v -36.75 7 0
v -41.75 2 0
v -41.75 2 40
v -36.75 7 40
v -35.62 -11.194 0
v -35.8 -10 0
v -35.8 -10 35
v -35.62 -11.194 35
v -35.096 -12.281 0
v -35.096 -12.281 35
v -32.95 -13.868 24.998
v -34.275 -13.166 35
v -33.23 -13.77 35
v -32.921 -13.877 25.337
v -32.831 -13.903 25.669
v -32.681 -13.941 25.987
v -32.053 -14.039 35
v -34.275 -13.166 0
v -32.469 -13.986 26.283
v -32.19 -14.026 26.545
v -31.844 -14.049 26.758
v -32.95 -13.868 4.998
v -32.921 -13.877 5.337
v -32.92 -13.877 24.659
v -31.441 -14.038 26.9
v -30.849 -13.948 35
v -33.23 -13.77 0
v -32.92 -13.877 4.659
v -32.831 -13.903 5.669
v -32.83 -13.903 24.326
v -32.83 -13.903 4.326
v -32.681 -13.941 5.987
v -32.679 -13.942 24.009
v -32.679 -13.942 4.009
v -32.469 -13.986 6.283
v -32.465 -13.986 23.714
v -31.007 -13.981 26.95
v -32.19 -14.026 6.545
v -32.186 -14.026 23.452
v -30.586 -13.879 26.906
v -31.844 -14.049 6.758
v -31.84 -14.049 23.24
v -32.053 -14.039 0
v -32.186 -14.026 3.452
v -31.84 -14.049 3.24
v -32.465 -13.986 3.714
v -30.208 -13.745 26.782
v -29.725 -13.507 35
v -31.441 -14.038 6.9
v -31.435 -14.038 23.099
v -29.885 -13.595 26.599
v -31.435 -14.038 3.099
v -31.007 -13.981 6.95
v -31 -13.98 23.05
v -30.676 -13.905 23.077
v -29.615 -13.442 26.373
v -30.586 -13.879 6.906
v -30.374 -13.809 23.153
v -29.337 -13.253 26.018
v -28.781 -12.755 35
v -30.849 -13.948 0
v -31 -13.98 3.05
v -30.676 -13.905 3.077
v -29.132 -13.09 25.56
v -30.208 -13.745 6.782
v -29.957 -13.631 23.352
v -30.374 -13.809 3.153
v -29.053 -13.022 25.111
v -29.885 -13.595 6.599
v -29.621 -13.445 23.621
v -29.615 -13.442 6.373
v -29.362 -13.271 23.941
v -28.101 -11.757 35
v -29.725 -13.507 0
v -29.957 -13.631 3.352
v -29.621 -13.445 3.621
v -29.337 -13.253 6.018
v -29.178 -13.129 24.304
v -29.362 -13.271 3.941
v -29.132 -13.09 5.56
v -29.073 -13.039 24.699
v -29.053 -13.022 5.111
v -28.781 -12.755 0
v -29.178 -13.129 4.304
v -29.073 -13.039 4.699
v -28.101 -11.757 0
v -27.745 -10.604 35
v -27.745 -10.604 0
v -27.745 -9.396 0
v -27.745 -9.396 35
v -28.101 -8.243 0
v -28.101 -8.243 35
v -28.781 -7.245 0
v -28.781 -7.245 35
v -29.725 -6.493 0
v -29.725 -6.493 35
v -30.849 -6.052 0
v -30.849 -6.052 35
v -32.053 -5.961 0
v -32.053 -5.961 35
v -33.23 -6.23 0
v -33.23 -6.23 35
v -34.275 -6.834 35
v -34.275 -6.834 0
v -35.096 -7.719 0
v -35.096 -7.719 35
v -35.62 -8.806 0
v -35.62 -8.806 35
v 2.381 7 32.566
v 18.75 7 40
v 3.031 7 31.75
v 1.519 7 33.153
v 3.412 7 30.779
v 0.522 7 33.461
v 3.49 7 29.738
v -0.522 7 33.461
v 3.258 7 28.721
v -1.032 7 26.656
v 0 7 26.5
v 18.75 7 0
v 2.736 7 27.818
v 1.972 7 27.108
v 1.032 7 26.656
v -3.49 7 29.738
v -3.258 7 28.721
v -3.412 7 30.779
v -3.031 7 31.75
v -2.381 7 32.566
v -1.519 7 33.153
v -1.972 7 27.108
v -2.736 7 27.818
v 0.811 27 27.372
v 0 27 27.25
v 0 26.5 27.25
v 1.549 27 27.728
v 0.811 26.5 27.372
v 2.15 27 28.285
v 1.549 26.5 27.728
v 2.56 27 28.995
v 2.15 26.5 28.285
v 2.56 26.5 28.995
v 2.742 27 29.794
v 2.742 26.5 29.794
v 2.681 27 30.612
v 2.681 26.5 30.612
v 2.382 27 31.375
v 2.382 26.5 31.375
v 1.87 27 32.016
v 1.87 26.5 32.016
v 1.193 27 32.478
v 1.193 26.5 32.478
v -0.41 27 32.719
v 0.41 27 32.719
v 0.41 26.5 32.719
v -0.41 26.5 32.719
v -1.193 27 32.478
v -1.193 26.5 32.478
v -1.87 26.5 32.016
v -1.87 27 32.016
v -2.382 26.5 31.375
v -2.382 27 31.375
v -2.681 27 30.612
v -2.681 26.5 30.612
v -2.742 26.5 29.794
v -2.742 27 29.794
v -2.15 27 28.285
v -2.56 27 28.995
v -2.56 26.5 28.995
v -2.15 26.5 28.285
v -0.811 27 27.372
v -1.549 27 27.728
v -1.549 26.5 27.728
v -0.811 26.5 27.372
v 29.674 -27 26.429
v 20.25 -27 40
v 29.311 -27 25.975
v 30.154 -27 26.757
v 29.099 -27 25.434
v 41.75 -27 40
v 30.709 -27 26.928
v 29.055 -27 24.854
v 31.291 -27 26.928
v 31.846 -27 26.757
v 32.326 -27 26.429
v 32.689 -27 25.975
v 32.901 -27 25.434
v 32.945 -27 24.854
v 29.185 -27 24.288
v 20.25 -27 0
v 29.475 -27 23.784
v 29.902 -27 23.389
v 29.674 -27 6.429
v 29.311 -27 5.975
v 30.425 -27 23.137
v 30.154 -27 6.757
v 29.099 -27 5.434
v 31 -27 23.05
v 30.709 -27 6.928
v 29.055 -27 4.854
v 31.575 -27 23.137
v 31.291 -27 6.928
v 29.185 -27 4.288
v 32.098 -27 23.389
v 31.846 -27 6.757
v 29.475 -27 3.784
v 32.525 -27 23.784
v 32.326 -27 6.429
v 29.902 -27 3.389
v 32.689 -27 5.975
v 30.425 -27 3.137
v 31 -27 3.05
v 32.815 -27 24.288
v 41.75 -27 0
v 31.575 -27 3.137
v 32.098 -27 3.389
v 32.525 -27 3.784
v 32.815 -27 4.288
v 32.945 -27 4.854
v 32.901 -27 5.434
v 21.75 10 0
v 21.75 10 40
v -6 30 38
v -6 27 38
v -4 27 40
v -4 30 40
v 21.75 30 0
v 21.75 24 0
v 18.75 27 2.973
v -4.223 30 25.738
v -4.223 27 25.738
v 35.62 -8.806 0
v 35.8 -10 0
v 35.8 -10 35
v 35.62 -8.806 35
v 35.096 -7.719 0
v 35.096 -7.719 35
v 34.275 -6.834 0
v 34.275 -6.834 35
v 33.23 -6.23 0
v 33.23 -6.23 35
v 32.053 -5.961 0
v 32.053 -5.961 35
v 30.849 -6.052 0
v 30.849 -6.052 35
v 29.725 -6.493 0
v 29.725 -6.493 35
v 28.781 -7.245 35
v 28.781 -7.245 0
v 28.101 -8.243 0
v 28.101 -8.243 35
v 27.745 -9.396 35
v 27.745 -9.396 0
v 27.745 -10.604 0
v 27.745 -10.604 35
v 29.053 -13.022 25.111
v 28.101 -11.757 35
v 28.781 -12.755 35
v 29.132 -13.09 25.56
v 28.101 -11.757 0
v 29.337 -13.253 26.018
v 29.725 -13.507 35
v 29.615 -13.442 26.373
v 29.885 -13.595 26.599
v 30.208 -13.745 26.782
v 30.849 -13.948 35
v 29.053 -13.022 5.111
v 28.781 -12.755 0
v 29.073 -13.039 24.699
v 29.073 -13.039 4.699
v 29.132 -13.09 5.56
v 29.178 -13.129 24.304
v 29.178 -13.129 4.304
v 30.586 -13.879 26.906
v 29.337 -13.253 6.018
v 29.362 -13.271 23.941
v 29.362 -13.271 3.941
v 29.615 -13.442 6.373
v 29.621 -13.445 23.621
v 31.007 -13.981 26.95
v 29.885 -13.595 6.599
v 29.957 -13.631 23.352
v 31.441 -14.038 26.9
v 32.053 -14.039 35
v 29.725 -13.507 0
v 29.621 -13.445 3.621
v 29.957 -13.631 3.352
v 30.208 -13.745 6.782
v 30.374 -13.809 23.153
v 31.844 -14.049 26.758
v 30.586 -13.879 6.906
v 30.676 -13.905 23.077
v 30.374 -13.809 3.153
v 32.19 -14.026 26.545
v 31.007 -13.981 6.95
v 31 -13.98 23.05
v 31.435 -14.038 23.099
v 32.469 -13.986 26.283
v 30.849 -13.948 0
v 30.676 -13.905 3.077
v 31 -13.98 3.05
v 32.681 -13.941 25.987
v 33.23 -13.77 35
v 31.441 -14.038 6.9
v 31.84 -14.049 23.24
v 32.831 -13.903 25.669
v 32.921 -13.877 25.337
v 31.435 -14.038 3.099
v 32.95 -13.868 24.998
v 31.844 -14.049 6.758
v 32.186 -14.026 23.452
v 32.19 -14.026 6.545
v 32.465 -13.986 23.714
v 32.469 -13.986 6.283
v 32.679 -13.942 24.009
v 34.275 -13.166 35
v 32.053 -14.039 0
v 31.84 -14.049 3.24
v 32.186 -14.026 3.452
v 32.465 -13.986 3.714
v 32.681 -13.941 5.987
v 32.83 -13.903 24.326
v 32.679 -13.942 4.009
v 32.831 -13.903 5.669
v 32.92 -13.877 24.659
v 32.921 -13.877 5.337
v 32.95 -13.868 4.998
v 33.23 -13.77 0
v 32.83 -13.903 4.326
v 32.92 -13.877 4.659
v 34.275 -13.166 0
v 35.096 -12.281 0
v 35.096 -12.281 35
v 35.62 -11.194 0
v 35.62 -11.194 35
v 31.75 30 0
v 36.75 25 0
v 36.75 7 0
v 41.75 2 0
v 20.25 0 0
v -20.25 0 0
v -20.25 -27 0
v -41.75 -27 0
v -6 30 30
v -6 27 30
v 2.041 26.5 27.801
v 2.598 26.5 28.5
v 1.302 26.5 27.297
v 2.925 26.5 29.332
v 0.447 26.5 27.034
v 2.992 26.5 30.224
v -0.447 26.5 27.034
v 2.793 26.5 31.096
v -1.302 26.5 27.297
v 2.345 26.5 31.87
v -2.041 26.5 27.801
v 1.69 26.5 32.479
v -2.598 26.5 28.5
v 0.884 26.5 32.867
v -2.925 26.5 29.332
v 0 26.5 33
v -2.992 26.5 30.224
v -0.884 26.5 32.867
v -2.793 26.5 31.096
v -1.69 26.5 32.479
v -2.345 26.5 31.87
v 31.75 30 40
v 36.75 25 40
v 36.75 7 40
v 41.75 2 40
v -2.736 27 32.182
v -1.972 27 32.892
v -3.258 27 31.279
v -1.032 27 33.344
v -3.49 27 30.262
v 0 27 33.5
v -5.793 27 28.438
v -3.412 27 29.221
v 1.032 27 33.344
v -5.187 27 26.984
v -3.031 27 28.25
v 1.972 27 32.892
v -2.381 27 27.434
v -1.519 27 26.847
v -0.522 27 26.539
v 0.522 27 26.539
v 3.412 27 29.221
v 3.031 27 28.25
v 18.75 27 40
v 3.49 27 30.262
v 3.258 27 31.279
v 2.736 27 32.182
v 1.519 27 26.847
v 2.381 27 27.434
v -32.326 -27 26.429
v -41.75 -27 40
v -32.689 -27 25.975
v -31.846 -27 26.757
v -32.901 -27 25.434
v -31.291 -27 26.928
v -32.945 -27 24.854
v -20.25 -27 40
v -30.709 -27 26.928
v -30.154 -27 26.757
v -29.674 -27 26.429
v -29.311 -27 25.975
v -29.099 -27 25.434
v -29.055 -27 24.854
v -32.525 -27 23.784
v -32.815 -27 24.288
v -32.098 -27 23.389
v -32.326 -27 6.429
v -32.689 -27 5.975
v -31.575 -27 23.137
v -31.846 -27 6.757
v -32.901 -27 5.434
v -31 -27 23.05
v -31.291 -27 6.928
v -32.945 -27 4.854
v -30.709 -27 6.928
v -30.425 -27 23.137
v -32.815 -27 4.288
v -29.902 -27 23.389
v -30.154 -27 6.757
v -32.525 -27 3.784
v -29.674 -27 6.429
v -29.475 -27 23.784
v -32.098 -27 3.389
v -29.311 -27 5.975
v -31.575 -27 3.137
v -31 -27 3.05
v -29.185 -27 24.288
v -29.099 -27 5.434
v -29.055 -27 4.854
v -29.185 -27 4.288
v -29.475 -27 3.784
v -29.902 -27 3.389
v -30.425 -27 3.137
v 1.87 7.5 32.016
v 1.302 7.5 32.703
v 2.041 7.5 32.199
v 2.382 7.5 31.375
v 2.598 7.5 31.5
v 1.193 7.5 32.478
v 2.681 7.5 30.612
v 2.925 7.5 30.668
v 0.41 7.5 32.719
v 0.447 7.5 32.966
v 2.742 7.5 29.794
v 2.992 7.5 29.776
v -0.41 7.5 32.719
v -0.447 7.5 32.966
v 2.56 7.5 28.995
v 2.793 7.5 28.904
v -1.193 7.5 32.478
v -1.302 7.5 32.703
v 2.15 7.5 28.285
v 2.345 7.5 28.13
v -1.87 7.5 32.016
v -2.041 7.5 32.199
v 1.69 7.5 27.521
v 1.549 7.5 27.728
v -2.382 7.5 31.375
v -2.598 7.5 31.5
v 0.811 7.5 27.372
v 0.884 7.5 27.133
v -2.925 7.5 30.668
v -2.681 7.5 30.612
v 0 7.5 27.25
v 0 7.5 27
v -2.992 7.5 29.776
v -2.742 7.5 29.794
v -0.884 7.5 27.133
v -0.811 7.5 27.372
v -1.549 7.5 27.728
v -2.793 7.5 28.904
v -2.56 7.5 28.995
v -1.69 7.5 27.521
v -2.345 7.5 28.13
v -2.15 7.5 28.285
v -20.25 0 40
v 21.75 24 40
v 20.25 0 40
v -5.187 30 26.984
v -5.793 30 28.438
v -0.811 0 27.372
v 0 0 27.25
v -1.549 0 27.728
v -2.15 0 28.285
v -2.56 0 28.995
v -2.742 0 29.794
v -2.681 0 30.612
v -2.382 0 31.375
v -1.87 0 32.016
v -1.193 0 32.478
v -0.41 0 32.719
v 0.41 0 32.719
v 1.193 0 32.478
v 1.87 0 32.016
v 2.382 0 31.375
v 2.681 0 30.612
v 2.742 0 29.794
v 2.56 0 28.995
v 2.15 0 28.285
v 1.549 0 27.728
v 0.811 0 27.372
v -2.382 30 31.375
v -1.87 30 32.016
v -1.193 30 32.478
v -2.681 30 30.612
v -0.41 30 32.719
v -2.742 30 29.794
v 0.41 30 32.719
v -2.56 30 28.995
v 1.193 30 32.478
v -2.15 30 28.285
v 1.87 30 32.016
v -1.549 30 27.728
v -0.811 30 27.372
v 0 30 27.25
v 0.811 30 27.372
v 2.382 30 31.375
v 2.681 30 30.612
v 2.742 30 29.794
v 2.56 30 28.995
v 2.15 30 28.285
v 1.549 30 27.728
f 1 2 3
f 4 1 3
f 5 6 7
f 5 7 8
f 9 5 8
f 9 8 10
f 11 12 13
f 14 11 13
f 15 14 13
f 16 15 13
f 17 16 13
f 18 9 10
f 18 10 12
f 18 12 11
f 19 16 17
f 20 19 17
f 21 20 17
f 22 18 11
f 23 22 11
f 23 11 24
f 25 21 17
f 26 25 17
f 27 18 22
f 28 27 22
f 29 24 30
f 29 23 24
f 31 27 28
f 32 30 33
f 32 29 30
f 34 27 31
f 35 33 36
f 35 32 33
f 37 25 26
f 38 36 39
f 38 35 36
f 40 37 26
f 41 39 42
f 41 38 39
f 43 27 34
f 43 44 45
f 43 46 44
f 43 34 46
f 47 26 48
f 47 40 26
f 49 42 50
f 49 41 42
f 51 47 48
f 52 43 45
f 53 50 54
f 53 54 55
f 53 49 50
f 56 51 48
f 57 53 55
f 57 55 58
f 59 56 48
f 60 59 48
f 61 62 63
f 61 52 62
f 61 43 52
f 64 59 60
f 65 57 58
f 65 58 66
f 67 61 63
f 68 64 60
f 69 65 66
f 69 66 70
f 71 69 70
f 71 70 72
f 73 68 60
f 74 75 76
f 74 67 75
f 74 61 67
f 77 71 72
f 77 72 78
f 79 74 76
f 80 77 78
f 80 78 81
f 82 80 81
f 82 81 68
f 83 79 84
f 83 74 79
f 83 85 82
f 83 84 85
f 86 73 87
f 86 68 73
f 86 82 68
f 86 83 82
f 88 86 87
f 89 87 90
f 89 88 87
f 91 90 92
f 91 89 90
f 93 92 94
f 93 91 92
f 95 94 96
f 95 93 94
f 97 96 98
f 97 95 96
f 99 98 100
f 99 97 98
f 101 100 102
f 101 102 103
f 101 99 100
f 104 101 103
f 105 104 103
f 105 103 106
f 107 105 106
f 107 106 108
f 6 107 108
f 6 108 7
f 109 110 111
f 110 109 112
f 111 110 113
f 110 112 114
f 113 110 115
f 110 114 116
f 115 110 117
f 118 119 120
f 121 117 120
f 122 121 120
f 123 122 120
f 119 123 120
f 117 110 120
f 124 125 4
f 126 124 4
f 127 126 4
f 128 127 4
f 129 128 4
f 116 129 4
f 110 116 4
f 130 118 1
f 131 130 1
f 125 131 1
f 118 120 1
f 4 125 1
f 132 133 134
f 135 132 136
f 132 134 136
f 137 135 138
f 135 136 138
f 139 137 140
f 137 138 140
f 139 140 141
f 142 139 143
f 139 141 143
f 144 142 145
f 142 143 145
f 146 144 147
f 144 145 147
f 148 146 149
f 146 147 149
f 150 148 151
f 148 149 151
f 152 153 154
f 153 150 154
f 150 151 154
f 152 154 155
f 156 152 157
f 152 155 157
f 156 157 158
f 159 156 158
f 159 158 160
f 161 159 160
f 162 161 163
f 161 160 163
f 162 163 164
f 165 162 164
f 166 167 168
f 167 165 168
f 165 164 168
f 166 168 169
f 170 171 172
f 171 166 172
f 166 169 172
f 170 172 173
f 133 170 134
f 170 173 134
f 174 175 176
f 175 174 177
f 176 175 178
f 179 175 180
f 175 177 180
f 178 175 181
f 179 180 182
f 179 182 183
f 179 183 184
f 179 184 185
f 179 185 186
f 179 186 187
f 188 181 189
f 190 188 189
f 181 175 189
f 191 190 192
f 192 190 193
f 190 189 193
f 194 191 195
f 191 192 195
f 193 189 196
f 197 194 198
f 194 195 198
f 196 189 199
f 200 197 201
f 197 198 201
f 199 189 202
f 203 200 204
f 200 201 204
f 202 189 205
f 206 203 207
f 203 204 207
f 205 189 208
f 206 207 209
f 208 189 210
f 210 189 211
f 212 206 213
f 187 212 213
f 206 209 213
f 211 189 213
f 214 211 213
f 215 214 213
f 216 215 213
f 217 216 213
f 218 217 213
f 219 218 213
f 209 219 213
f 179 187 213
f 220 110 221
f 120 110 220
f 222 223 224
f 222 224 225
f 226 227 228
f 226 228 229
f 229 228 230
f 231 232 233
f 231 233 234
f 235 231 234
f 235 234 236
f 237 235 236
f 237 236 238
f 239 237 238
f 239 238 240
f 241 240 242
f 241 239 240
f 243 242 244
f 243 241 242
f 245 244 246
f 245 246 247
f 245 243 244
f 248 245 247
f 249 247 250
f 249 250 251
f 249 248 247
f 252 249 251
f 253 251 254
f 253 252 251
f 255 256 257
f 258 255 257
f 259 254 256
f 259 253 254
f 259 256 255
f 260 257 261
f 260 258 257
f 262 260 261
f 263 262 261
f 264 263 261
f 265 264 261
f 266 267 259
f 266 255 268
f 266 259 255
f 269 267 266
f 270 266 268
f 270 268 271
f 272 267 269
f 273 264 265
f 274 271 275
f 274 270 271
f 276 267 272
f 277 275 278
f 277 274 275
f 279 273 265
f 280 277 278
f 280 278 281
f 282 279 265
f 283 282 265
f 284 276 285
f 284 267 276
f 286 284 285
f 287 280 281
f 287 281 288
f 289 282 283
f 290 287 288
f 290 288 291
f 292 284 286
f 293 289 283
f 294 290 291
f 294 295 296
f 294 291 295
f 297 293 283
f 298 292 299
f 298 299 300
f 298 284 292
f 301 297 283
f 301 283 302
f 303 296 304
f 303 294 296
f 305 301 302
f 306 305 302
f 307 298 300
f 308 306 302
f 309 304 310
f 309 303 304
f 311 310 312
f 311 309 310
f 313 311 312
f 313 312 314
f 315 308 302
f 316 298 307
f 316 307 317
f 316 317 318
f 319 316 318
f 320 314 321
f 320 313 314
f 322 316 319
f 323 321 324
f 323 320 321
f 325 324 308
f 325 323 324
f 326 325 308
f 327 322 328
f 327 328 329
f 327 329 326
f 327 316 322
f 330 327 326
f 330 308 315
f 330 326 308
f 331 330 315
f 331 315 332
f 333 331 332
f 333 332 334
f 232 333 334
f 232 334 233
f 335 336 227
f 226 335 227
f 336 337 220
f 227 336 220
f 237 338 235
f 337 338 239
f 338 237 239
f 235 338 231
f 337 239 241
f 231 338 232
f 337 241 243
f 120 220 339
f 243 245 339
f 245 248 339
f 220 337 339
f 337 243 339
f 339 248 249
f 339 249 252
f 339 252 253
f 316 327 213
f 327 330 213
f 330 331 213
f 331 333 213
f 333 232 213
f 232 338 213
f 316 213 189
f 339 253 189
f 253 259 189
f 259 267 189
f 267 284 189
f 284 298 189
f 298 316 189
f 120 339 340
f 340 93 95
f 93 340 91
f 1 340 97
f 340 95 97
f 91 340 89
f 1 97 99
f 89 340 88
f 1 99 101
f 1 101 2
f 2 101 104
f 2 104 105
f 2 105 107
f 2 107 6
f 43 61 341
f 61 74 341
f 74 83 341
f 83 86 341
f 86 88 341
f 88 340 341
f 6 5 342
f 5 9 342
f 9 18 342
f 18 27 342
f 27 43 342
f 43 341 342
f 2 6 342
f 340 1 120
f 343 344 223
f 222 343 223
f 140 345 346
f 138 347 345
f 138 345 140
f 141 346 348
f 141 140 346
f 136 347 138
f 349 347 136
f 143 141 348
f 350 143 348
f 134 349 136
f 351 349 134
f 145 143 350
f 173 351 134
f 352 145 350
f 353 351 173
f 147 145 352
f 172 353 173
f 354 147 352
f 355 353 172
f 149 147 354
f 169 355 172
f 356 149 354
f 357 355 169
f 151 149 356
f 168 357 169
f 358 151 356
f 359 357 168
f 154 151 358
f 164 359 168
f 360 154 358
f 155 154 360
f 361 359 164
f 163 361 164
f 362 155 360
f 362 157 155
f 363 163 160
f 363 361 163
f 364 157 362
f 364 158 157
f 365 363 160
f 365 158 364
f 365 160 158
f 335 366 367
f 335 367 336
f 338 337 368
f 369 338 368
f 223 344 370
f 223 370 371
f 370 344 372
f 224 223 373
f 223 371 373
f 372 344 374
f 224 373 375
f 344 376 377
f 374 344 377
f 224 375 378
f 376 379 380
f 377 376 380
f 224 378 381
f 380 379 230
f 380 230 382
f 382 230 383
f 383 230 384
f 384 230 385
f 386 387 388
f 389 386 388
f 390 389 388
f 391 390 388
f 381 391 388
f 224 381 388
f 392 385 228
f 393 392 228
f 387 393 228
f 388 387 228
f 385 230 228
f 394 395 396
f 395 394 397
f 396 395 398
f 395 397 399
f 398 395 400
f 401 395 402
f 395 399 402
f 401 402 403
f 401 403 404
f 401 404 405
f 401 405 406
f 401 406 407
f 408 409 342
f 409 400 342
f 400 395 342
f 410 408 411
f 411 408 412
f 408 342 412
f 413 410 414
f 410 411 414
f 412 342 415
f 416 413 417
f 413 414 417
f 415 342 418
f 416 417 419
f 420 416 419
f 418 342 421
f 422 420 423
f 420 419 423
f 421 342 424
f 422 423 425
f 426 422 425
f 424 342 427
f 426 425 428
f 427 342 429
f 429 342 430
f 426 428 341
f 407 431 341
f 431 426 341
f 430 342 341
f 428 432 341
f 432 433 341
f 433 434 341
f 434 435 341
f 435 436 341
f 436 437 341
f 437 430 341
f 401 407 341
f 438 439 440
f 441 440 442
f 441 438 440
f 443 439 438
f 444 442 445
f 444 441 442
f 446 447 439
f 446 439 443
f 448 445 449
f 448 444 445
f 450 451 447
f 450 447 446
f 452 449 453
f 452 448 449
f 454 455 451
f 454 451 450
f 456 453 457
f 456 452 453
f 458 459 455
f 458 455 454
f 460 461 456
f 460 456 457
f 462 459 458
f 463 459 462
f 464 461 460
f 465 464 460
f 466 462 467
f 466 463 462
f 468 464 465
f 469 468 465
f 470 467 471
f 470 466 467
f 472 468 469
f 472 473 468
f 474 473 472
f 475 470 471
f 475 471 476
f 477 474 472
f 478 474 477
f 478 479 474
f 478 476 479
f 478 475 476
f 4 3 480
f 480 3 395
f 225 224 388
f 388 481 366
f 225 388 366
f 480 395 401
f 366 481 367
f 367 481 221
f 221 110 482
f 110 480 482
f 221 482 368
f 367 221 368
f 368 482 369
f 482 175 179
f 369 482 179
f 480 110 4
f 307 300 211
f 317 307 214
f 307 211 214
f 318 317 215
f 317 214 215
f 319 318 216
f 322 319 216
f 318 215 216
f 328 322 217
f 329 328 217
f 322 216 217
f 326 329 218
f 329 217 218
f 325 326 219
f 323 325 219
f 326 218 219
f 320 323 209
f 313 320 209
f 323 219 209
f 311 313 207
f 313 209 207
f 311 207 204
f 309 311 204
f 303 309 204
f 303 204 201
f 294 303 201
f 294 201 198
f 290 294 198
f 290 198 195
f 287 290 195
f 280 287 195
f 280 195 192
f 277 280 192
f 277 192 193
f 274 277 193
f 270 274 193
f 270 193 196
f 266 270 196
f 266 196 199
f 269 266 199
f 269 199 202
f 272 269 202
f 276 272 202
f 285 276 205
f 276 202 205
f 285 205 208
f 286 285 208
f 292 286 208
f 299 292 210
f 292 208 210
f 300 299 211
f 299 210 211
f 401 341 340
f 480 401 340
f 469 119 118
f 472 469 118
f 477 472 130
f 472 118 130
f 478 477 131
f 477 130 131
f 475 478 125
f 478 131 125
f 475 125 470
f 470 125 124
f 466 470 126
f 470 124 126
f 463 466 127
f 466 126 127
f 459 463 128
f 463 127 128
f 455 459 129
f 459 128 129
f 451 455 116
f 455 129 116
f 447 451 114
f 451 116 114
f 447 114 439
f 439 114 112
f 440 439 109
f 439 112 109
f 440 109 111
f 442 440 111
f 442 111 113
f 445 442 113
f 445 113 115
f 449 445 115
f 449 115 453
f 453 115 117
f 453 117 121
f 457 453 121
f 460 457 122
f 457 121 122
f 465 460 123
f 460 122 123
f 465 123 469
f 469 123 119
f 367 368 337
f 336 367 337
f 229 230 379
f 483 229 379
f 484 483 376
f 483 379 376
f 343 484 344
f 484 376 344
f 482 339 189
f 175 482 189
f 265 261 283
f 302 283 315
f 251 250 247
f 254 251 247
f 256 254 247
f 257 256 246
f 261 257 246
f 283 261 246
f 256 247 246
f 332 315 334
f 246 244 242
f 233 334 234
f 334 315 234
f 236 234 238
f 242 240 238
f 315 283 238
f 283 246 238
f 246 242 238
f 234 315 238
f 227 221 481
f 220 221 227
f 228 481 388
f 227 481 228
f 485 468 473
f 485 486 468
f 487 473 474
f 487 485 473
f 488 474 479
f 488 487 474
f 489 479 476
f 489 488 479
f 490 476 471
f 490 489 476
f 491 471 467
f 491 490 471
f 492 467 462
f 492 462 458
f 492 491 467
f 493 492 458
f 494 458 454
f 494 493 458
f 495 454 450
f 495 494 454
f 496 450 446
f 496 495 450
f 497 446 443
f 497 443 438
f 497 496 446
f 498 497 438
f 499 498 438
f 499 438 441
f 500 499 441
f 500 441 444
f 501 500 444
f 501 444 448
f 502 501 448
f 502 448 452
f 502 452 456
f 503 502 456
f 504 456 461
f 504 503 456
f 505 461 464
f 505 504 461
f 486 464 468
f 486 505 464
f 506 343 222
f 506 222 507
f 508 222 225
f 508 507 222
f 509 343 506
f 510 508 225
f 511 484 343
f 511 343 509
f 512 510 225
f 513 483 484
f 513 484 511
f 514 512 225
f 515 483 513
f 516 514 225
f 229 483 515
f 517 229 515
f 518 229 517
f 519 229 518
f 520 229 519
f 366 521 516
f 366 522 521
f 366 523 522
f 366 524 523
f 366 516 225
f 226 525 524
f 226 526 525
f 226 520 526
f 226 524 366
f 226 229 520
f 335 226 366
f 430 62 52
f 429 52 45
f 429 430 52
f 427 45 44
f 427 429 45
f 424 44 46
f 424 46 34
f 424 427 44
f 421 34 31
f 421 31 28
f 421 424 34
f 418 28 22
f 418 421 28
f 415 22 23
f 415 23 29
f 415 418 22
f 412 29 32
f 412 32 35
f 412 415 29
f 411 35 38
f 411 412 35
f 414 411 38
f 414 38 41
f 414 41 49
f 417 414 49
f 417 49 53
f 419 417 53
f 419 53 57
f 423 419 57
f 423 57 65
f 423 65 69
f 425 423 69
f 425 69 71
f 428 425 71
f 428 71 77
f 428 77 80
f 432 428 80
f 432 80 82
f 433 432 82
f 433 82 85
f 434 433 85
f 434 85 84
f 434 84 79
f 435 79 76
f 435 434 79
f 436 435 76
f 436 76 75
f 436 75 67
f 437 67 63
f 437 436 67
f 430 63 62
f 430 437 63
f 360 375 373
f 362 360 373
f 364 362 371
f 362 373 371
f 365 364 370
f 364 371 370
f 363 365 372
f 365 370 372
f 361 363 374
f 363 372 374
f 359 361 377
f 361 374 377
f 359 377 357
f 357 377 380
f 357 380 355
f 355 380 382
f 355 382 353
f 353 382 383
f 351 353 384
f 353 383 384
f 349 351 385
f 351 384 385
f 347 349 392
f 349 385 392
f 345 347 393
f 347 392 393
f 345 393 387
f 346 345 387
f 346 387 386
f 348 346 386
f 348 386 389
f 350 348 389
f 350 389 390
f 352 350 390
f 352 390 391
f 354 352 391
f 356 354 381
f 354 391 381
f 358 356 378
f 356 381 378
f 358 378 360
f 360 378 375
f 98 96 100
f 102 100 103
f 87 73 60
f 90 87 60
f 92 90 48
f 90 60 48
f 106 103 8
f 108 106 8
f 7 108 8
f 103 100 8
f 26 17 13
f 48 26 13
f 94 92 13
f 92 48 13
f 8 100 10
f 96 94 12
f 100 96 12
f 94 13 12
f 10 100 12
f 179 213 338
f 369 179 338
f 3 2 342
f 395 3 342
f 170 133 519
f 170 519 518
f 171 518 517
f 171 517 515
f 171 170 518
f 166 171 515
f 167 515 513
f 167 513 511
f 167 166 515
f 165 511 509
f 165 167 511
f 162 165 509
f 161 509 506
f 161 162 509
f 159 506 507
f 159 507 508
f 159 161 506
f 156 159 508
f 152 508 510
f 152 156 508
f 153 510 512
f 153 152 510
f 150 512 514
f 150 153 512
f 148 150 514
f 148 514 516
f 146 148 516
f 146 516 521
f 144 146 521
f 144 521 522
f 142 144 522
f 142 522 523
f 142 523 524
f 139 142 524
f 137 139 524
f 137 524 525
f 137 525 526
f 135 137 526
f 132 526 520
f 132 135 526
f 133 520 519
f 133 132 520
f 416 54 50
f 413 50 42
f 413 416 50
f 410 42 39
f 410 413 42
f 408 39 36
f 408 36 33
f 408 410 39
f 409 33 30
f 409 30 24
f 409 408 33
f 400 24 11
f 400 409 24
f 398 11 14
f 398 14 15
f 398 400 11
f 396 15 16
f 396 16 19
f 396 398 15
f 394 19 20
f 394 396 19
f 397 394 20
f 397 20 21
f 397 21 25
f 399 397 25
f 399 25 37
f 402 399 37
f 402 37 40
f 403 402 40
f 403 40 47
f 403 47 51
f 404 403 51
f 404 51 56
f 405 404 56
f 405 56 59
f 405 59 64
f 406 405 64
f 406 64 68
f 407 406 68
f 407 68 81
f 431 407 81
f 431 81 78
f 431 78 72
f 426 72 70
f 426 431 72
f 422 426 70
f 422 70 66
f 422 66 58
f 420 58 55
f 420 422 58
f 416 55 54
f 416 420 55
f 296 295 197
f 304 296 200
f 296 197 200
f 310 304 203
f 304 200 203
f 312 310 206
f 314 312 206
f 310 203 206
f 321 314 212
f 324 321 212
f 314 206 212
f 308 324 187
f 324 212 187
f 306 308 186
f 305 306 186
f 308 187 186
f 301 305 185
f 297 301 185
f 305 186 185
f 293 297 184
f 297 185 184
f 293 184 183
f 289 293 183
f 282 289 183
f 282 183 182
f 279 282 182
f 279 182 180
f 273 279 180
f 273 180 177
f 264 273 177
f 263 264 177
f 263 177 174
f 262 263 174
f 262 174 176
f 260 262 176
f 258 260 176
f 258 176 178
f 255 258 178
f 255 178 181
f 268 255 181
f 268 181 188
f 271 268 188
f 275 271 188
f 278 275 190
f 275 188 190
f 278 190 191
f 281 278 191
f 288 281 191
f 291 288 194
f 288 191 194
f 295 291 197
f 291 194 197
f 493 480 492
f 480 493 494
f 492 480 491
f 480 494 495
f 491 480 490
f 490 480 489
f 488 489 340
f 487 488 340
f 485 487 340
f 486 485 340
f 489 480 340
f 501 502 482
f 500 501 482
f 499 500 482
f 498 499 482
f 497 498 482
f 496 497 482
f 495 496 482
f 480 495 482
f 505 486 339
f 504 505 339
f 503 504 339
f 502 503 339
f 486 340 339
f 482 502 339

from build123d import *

# Parameters (mm, degrees)
SKETCH1_R           = 4.05
BOSS_EXTRUDE1_DEPTH = 40
SKETCH2_R           = 2.75
CUT_EXTRUDE1_DEPTH  = 40
CHAMFER1_SIZE       = 5
SKETCH4_W           = 15
SKETCH4_H           = 40
BOSS_EXTRUDE2_DEPTH = 20
SKETCH5_R           = 2.75
BOSS_EXTRUDE3_DEPTH = 3
CHAMFER2_SIZE       = 5
CHAMFER3_SIZE       = 5
BOSS_EXTRUDE4_START = -5
SKETCH6_R           = 4.05
BOSS_EXTRUDE4_DEPTH = 5
SKETCH7_R           = 1.95
CUT_EXTRUDE2_DEPTH  = 20
CHAMFER4_SIZE       = 2
CHAMFER5_SIZE       = 3
SKETCH8_R           = 3
SKETCH8_R_2         = 2.75
BOSS_EXTRUDE5_DEPTH = 0.5
CHAMFER6_SIZE       = 0.5
BOSS_EXTRUDE6_START = 0.5
SKETCH9_R           = 3
SKETCH9_R_2         = 2.75
BOSS_EXTRUDE6_DEPTH = 0.5
CHAMFER7_SIZE       = 0.5


with BuildPart() as part:
    # Sketch1 → Boss-Extrude1 (new body)
    with BuildSketch(Plane.XY):
        Polygon((-20.25, 0), (20.25, 0), (20.25, -27), (41.75, -27), (41.75, 7), (-41.75, 7), (-41.75, -27), (-20.25, -27), align=None)
        with Locations((31.75, -10)):
            Circle(SKETCH1_R, mode=Mode.SUBTRACT)
        with Locations(Location((-31.75, -10, 0), (0, 0, 180))):
            Circle(SKETCH1_R, mode=Mode.SUBTRACT)
    extrude(amount=BOSS_EXTRUDE1_DEPTH)

    # Sketch2 → Cut-Extrude1 (cut)
    with BuildSketch(Plane(origin=(0, 0, 0), x_dir=(-1, 0, 0), z_dir=(0, -1, 0))):
        with Locations(Location((0, -30, 0), (0, 0, 90))):
            Circle(SKETCH2_R)
    extrude(amount=-CUT_EXTRUDE1_DEPTH, mode=Mode.SUBTRACT)

    # Chamfer1
    chamfer1_edges = [part.edges().sort_by_distance(p)[0] for p in [
        (41.75, 7, 20),
    ]]
    chamfer(chamfer1_edges, length=CHAMFER1_SIZE)

    # Sketch4 → Boss-Extrude2 (add)
    with BuildSketch(Plane(origin=(0, 7, 0), x_dir=(1, 0, 0), z_dir=(0, 1, 0))):
        with Locations((29.25, -20)):
            Rectangle(SKETCH4_W, SKETCH4_H)
    extrude(amount=BOSS_EXTRUDE2_DEPTH)

    # Sketch5 → Boss-Extrude3 (add)
    with BuildSketch(Plane(origin=(0, 27, 0), x_dir=(1, 0, 0), z_dir=(0, 1, 0))):
        with BuildLine():
            Line((20.579588566, -40), (21.75, -40))
            Line((21.75, -40), (36.75, -40))
            Line((36.75, -40), (36.75, 0))
            Line((36.75, 0), (21.75, 0))
            Line((21.75, 0), (-4.223300645, -25.738107033))
            ThreePointArc((-4.223300645, -25.738107033), (-5.538041345, -27.691299485), (-6, -30))
            Line((-6, -30), (-6, -40))
            Line((-6, -40), (20.579588566, -40))
        make_face()
        with Locations(Location((0, -30, 0), (0, 0, 90))):
            Circle(SKETCH5_R, mode=Mode.SUBTRACT)
    extrude(amount=BOSS_EXTRUDE3_DEPTH)

    # Chamfer2
    chamfer2_edges = [part.edges().sort_by_distance(p)[0] for p in [
        (36.75, 30, 20),
    ]]
    chamfer(chamfer2_edges, length=CHAMFER2_SIZE)

    # Chamfer3
    chamfer3_edges = [part.edges().sort_by_distance(p)[0] for p in [
        (-41.75, 7, 20),
    ]]
    chamfer(chamfer3_edges, length=CHAMFER3_SIZE)

    # Sketch6 → Boss-Extrude4 (add)
    with BuildSketch(Plane.XY.offset(40).offset(BOSS_EXTRUDE4_START)):
        with Locations(Location((-31.75, -10, 0), (0, 0, 180))):
            Circle(SKETCH6_R)
        with Locations((31.75, -10)):
            Circle(SKETCH6_R)
    extrude(amount=BOSS_EXTRUDE4_DEPTH)

    # Sketch7 → Cut-Extrude2 (cut)
    with BuildSketch(Plane(origin=(0, -27, 0), x_dir=(-1, 0, 0), z_dir=(0, -1, 0))):
        with Locations(Location((-31, -5, 0), (0, 0, 90))):
            Circle(SKETCH7_R)
        with Locations(Location((-31, -25, 0), (0, 0, 90))):
            Circle(SKETCH7_R)
    cut_extrude2 = extrude(amount=-CUT_EXTRUDE2_DEPTH, mode=Mode.SUBTRACT)

    # Mirror1: Cut-Extrude2 across plane
    add(cut_extrude2.mirror(Plane(origin=(0, 0, 0), x_dir=(0, 0, 1), z_dir=(1, 0, 0))), mode=Mode.SUBTRACT)

    # Chamfer4
    chamfer4_edges = [part.edges().sort_by_distance(p)[0] for p in [
        (-6, 28.5, 40),
    ]]
    chamfer(chamfer4_edges, length=CHAMFER4_SIZE)

    # Chamfer5
    chamfer5_edges = [part.edges().sort_by_distance(p)[0] for p in [
        (21.75, 7, 20),
        (21.75, 27, 20),
    ]]
    chamfer(chamfer5_edges, length=CHAMFER5_SIZE)

    # Sketch8 → Boss-Extrude5 (add)
    with BuildSketch(Plane(origin=(0, 7, 0), x_dir=(1, 0, 0), z_dir=(0, 1, 0))):
        with Locations(Location((0, -30, 0), (0, 0, 90))):
            Circle(SKETCH8_R)
        with Locations(Location((0, -30, 0), (0, 0, 90))):
            Circle(SKETCH8_R_2, mode=Mode.SUBTRACT)
    extrude(amount=BOSS_EXTRUDE5_DEPTH)

    # Chamfer6
    chamfer6_edges = [part.edges().sort_by_distance(p)[0] for p in [
        (0, 7, 33),
    ]]
    chamfer(chamfer6_edges, length=CHAMFER6_SIZE - 0.0001)  # a hair under: the kernel refuses the full size

    # Sketch9 → Boss-Extrude6 (add)
    with BuildSketch(Plane(origin=(0, 27, 0), x_dir=(-1, 0, 0), z_dir=(0, -1, 0)).offset(BOSS_EXTRUDE6_START)):
        with Locations(Location((0, -30, 0), (0, 0, 270))):
            Circle(SKETCH9_R)
        with Locations(Location((0, -30, 0), (0, 0, 90))):
            Circle(SKETCH9_R_2, mode=Mode.SUBTRACT)
    extrude(amount=-BOSS_EXTRUDE6_DEPTH)

    # Chamfer7
    chamfer7_edges = [part.edges().sort_by_distance(p)[0] for p in [
        (0, 27, 27),
    ]]
    chamfer(chamfer7_edges, length=CHAMFER7_SIZE - 0.0001)  # a hair under: the kernel refuses the full size


solid = part.part
